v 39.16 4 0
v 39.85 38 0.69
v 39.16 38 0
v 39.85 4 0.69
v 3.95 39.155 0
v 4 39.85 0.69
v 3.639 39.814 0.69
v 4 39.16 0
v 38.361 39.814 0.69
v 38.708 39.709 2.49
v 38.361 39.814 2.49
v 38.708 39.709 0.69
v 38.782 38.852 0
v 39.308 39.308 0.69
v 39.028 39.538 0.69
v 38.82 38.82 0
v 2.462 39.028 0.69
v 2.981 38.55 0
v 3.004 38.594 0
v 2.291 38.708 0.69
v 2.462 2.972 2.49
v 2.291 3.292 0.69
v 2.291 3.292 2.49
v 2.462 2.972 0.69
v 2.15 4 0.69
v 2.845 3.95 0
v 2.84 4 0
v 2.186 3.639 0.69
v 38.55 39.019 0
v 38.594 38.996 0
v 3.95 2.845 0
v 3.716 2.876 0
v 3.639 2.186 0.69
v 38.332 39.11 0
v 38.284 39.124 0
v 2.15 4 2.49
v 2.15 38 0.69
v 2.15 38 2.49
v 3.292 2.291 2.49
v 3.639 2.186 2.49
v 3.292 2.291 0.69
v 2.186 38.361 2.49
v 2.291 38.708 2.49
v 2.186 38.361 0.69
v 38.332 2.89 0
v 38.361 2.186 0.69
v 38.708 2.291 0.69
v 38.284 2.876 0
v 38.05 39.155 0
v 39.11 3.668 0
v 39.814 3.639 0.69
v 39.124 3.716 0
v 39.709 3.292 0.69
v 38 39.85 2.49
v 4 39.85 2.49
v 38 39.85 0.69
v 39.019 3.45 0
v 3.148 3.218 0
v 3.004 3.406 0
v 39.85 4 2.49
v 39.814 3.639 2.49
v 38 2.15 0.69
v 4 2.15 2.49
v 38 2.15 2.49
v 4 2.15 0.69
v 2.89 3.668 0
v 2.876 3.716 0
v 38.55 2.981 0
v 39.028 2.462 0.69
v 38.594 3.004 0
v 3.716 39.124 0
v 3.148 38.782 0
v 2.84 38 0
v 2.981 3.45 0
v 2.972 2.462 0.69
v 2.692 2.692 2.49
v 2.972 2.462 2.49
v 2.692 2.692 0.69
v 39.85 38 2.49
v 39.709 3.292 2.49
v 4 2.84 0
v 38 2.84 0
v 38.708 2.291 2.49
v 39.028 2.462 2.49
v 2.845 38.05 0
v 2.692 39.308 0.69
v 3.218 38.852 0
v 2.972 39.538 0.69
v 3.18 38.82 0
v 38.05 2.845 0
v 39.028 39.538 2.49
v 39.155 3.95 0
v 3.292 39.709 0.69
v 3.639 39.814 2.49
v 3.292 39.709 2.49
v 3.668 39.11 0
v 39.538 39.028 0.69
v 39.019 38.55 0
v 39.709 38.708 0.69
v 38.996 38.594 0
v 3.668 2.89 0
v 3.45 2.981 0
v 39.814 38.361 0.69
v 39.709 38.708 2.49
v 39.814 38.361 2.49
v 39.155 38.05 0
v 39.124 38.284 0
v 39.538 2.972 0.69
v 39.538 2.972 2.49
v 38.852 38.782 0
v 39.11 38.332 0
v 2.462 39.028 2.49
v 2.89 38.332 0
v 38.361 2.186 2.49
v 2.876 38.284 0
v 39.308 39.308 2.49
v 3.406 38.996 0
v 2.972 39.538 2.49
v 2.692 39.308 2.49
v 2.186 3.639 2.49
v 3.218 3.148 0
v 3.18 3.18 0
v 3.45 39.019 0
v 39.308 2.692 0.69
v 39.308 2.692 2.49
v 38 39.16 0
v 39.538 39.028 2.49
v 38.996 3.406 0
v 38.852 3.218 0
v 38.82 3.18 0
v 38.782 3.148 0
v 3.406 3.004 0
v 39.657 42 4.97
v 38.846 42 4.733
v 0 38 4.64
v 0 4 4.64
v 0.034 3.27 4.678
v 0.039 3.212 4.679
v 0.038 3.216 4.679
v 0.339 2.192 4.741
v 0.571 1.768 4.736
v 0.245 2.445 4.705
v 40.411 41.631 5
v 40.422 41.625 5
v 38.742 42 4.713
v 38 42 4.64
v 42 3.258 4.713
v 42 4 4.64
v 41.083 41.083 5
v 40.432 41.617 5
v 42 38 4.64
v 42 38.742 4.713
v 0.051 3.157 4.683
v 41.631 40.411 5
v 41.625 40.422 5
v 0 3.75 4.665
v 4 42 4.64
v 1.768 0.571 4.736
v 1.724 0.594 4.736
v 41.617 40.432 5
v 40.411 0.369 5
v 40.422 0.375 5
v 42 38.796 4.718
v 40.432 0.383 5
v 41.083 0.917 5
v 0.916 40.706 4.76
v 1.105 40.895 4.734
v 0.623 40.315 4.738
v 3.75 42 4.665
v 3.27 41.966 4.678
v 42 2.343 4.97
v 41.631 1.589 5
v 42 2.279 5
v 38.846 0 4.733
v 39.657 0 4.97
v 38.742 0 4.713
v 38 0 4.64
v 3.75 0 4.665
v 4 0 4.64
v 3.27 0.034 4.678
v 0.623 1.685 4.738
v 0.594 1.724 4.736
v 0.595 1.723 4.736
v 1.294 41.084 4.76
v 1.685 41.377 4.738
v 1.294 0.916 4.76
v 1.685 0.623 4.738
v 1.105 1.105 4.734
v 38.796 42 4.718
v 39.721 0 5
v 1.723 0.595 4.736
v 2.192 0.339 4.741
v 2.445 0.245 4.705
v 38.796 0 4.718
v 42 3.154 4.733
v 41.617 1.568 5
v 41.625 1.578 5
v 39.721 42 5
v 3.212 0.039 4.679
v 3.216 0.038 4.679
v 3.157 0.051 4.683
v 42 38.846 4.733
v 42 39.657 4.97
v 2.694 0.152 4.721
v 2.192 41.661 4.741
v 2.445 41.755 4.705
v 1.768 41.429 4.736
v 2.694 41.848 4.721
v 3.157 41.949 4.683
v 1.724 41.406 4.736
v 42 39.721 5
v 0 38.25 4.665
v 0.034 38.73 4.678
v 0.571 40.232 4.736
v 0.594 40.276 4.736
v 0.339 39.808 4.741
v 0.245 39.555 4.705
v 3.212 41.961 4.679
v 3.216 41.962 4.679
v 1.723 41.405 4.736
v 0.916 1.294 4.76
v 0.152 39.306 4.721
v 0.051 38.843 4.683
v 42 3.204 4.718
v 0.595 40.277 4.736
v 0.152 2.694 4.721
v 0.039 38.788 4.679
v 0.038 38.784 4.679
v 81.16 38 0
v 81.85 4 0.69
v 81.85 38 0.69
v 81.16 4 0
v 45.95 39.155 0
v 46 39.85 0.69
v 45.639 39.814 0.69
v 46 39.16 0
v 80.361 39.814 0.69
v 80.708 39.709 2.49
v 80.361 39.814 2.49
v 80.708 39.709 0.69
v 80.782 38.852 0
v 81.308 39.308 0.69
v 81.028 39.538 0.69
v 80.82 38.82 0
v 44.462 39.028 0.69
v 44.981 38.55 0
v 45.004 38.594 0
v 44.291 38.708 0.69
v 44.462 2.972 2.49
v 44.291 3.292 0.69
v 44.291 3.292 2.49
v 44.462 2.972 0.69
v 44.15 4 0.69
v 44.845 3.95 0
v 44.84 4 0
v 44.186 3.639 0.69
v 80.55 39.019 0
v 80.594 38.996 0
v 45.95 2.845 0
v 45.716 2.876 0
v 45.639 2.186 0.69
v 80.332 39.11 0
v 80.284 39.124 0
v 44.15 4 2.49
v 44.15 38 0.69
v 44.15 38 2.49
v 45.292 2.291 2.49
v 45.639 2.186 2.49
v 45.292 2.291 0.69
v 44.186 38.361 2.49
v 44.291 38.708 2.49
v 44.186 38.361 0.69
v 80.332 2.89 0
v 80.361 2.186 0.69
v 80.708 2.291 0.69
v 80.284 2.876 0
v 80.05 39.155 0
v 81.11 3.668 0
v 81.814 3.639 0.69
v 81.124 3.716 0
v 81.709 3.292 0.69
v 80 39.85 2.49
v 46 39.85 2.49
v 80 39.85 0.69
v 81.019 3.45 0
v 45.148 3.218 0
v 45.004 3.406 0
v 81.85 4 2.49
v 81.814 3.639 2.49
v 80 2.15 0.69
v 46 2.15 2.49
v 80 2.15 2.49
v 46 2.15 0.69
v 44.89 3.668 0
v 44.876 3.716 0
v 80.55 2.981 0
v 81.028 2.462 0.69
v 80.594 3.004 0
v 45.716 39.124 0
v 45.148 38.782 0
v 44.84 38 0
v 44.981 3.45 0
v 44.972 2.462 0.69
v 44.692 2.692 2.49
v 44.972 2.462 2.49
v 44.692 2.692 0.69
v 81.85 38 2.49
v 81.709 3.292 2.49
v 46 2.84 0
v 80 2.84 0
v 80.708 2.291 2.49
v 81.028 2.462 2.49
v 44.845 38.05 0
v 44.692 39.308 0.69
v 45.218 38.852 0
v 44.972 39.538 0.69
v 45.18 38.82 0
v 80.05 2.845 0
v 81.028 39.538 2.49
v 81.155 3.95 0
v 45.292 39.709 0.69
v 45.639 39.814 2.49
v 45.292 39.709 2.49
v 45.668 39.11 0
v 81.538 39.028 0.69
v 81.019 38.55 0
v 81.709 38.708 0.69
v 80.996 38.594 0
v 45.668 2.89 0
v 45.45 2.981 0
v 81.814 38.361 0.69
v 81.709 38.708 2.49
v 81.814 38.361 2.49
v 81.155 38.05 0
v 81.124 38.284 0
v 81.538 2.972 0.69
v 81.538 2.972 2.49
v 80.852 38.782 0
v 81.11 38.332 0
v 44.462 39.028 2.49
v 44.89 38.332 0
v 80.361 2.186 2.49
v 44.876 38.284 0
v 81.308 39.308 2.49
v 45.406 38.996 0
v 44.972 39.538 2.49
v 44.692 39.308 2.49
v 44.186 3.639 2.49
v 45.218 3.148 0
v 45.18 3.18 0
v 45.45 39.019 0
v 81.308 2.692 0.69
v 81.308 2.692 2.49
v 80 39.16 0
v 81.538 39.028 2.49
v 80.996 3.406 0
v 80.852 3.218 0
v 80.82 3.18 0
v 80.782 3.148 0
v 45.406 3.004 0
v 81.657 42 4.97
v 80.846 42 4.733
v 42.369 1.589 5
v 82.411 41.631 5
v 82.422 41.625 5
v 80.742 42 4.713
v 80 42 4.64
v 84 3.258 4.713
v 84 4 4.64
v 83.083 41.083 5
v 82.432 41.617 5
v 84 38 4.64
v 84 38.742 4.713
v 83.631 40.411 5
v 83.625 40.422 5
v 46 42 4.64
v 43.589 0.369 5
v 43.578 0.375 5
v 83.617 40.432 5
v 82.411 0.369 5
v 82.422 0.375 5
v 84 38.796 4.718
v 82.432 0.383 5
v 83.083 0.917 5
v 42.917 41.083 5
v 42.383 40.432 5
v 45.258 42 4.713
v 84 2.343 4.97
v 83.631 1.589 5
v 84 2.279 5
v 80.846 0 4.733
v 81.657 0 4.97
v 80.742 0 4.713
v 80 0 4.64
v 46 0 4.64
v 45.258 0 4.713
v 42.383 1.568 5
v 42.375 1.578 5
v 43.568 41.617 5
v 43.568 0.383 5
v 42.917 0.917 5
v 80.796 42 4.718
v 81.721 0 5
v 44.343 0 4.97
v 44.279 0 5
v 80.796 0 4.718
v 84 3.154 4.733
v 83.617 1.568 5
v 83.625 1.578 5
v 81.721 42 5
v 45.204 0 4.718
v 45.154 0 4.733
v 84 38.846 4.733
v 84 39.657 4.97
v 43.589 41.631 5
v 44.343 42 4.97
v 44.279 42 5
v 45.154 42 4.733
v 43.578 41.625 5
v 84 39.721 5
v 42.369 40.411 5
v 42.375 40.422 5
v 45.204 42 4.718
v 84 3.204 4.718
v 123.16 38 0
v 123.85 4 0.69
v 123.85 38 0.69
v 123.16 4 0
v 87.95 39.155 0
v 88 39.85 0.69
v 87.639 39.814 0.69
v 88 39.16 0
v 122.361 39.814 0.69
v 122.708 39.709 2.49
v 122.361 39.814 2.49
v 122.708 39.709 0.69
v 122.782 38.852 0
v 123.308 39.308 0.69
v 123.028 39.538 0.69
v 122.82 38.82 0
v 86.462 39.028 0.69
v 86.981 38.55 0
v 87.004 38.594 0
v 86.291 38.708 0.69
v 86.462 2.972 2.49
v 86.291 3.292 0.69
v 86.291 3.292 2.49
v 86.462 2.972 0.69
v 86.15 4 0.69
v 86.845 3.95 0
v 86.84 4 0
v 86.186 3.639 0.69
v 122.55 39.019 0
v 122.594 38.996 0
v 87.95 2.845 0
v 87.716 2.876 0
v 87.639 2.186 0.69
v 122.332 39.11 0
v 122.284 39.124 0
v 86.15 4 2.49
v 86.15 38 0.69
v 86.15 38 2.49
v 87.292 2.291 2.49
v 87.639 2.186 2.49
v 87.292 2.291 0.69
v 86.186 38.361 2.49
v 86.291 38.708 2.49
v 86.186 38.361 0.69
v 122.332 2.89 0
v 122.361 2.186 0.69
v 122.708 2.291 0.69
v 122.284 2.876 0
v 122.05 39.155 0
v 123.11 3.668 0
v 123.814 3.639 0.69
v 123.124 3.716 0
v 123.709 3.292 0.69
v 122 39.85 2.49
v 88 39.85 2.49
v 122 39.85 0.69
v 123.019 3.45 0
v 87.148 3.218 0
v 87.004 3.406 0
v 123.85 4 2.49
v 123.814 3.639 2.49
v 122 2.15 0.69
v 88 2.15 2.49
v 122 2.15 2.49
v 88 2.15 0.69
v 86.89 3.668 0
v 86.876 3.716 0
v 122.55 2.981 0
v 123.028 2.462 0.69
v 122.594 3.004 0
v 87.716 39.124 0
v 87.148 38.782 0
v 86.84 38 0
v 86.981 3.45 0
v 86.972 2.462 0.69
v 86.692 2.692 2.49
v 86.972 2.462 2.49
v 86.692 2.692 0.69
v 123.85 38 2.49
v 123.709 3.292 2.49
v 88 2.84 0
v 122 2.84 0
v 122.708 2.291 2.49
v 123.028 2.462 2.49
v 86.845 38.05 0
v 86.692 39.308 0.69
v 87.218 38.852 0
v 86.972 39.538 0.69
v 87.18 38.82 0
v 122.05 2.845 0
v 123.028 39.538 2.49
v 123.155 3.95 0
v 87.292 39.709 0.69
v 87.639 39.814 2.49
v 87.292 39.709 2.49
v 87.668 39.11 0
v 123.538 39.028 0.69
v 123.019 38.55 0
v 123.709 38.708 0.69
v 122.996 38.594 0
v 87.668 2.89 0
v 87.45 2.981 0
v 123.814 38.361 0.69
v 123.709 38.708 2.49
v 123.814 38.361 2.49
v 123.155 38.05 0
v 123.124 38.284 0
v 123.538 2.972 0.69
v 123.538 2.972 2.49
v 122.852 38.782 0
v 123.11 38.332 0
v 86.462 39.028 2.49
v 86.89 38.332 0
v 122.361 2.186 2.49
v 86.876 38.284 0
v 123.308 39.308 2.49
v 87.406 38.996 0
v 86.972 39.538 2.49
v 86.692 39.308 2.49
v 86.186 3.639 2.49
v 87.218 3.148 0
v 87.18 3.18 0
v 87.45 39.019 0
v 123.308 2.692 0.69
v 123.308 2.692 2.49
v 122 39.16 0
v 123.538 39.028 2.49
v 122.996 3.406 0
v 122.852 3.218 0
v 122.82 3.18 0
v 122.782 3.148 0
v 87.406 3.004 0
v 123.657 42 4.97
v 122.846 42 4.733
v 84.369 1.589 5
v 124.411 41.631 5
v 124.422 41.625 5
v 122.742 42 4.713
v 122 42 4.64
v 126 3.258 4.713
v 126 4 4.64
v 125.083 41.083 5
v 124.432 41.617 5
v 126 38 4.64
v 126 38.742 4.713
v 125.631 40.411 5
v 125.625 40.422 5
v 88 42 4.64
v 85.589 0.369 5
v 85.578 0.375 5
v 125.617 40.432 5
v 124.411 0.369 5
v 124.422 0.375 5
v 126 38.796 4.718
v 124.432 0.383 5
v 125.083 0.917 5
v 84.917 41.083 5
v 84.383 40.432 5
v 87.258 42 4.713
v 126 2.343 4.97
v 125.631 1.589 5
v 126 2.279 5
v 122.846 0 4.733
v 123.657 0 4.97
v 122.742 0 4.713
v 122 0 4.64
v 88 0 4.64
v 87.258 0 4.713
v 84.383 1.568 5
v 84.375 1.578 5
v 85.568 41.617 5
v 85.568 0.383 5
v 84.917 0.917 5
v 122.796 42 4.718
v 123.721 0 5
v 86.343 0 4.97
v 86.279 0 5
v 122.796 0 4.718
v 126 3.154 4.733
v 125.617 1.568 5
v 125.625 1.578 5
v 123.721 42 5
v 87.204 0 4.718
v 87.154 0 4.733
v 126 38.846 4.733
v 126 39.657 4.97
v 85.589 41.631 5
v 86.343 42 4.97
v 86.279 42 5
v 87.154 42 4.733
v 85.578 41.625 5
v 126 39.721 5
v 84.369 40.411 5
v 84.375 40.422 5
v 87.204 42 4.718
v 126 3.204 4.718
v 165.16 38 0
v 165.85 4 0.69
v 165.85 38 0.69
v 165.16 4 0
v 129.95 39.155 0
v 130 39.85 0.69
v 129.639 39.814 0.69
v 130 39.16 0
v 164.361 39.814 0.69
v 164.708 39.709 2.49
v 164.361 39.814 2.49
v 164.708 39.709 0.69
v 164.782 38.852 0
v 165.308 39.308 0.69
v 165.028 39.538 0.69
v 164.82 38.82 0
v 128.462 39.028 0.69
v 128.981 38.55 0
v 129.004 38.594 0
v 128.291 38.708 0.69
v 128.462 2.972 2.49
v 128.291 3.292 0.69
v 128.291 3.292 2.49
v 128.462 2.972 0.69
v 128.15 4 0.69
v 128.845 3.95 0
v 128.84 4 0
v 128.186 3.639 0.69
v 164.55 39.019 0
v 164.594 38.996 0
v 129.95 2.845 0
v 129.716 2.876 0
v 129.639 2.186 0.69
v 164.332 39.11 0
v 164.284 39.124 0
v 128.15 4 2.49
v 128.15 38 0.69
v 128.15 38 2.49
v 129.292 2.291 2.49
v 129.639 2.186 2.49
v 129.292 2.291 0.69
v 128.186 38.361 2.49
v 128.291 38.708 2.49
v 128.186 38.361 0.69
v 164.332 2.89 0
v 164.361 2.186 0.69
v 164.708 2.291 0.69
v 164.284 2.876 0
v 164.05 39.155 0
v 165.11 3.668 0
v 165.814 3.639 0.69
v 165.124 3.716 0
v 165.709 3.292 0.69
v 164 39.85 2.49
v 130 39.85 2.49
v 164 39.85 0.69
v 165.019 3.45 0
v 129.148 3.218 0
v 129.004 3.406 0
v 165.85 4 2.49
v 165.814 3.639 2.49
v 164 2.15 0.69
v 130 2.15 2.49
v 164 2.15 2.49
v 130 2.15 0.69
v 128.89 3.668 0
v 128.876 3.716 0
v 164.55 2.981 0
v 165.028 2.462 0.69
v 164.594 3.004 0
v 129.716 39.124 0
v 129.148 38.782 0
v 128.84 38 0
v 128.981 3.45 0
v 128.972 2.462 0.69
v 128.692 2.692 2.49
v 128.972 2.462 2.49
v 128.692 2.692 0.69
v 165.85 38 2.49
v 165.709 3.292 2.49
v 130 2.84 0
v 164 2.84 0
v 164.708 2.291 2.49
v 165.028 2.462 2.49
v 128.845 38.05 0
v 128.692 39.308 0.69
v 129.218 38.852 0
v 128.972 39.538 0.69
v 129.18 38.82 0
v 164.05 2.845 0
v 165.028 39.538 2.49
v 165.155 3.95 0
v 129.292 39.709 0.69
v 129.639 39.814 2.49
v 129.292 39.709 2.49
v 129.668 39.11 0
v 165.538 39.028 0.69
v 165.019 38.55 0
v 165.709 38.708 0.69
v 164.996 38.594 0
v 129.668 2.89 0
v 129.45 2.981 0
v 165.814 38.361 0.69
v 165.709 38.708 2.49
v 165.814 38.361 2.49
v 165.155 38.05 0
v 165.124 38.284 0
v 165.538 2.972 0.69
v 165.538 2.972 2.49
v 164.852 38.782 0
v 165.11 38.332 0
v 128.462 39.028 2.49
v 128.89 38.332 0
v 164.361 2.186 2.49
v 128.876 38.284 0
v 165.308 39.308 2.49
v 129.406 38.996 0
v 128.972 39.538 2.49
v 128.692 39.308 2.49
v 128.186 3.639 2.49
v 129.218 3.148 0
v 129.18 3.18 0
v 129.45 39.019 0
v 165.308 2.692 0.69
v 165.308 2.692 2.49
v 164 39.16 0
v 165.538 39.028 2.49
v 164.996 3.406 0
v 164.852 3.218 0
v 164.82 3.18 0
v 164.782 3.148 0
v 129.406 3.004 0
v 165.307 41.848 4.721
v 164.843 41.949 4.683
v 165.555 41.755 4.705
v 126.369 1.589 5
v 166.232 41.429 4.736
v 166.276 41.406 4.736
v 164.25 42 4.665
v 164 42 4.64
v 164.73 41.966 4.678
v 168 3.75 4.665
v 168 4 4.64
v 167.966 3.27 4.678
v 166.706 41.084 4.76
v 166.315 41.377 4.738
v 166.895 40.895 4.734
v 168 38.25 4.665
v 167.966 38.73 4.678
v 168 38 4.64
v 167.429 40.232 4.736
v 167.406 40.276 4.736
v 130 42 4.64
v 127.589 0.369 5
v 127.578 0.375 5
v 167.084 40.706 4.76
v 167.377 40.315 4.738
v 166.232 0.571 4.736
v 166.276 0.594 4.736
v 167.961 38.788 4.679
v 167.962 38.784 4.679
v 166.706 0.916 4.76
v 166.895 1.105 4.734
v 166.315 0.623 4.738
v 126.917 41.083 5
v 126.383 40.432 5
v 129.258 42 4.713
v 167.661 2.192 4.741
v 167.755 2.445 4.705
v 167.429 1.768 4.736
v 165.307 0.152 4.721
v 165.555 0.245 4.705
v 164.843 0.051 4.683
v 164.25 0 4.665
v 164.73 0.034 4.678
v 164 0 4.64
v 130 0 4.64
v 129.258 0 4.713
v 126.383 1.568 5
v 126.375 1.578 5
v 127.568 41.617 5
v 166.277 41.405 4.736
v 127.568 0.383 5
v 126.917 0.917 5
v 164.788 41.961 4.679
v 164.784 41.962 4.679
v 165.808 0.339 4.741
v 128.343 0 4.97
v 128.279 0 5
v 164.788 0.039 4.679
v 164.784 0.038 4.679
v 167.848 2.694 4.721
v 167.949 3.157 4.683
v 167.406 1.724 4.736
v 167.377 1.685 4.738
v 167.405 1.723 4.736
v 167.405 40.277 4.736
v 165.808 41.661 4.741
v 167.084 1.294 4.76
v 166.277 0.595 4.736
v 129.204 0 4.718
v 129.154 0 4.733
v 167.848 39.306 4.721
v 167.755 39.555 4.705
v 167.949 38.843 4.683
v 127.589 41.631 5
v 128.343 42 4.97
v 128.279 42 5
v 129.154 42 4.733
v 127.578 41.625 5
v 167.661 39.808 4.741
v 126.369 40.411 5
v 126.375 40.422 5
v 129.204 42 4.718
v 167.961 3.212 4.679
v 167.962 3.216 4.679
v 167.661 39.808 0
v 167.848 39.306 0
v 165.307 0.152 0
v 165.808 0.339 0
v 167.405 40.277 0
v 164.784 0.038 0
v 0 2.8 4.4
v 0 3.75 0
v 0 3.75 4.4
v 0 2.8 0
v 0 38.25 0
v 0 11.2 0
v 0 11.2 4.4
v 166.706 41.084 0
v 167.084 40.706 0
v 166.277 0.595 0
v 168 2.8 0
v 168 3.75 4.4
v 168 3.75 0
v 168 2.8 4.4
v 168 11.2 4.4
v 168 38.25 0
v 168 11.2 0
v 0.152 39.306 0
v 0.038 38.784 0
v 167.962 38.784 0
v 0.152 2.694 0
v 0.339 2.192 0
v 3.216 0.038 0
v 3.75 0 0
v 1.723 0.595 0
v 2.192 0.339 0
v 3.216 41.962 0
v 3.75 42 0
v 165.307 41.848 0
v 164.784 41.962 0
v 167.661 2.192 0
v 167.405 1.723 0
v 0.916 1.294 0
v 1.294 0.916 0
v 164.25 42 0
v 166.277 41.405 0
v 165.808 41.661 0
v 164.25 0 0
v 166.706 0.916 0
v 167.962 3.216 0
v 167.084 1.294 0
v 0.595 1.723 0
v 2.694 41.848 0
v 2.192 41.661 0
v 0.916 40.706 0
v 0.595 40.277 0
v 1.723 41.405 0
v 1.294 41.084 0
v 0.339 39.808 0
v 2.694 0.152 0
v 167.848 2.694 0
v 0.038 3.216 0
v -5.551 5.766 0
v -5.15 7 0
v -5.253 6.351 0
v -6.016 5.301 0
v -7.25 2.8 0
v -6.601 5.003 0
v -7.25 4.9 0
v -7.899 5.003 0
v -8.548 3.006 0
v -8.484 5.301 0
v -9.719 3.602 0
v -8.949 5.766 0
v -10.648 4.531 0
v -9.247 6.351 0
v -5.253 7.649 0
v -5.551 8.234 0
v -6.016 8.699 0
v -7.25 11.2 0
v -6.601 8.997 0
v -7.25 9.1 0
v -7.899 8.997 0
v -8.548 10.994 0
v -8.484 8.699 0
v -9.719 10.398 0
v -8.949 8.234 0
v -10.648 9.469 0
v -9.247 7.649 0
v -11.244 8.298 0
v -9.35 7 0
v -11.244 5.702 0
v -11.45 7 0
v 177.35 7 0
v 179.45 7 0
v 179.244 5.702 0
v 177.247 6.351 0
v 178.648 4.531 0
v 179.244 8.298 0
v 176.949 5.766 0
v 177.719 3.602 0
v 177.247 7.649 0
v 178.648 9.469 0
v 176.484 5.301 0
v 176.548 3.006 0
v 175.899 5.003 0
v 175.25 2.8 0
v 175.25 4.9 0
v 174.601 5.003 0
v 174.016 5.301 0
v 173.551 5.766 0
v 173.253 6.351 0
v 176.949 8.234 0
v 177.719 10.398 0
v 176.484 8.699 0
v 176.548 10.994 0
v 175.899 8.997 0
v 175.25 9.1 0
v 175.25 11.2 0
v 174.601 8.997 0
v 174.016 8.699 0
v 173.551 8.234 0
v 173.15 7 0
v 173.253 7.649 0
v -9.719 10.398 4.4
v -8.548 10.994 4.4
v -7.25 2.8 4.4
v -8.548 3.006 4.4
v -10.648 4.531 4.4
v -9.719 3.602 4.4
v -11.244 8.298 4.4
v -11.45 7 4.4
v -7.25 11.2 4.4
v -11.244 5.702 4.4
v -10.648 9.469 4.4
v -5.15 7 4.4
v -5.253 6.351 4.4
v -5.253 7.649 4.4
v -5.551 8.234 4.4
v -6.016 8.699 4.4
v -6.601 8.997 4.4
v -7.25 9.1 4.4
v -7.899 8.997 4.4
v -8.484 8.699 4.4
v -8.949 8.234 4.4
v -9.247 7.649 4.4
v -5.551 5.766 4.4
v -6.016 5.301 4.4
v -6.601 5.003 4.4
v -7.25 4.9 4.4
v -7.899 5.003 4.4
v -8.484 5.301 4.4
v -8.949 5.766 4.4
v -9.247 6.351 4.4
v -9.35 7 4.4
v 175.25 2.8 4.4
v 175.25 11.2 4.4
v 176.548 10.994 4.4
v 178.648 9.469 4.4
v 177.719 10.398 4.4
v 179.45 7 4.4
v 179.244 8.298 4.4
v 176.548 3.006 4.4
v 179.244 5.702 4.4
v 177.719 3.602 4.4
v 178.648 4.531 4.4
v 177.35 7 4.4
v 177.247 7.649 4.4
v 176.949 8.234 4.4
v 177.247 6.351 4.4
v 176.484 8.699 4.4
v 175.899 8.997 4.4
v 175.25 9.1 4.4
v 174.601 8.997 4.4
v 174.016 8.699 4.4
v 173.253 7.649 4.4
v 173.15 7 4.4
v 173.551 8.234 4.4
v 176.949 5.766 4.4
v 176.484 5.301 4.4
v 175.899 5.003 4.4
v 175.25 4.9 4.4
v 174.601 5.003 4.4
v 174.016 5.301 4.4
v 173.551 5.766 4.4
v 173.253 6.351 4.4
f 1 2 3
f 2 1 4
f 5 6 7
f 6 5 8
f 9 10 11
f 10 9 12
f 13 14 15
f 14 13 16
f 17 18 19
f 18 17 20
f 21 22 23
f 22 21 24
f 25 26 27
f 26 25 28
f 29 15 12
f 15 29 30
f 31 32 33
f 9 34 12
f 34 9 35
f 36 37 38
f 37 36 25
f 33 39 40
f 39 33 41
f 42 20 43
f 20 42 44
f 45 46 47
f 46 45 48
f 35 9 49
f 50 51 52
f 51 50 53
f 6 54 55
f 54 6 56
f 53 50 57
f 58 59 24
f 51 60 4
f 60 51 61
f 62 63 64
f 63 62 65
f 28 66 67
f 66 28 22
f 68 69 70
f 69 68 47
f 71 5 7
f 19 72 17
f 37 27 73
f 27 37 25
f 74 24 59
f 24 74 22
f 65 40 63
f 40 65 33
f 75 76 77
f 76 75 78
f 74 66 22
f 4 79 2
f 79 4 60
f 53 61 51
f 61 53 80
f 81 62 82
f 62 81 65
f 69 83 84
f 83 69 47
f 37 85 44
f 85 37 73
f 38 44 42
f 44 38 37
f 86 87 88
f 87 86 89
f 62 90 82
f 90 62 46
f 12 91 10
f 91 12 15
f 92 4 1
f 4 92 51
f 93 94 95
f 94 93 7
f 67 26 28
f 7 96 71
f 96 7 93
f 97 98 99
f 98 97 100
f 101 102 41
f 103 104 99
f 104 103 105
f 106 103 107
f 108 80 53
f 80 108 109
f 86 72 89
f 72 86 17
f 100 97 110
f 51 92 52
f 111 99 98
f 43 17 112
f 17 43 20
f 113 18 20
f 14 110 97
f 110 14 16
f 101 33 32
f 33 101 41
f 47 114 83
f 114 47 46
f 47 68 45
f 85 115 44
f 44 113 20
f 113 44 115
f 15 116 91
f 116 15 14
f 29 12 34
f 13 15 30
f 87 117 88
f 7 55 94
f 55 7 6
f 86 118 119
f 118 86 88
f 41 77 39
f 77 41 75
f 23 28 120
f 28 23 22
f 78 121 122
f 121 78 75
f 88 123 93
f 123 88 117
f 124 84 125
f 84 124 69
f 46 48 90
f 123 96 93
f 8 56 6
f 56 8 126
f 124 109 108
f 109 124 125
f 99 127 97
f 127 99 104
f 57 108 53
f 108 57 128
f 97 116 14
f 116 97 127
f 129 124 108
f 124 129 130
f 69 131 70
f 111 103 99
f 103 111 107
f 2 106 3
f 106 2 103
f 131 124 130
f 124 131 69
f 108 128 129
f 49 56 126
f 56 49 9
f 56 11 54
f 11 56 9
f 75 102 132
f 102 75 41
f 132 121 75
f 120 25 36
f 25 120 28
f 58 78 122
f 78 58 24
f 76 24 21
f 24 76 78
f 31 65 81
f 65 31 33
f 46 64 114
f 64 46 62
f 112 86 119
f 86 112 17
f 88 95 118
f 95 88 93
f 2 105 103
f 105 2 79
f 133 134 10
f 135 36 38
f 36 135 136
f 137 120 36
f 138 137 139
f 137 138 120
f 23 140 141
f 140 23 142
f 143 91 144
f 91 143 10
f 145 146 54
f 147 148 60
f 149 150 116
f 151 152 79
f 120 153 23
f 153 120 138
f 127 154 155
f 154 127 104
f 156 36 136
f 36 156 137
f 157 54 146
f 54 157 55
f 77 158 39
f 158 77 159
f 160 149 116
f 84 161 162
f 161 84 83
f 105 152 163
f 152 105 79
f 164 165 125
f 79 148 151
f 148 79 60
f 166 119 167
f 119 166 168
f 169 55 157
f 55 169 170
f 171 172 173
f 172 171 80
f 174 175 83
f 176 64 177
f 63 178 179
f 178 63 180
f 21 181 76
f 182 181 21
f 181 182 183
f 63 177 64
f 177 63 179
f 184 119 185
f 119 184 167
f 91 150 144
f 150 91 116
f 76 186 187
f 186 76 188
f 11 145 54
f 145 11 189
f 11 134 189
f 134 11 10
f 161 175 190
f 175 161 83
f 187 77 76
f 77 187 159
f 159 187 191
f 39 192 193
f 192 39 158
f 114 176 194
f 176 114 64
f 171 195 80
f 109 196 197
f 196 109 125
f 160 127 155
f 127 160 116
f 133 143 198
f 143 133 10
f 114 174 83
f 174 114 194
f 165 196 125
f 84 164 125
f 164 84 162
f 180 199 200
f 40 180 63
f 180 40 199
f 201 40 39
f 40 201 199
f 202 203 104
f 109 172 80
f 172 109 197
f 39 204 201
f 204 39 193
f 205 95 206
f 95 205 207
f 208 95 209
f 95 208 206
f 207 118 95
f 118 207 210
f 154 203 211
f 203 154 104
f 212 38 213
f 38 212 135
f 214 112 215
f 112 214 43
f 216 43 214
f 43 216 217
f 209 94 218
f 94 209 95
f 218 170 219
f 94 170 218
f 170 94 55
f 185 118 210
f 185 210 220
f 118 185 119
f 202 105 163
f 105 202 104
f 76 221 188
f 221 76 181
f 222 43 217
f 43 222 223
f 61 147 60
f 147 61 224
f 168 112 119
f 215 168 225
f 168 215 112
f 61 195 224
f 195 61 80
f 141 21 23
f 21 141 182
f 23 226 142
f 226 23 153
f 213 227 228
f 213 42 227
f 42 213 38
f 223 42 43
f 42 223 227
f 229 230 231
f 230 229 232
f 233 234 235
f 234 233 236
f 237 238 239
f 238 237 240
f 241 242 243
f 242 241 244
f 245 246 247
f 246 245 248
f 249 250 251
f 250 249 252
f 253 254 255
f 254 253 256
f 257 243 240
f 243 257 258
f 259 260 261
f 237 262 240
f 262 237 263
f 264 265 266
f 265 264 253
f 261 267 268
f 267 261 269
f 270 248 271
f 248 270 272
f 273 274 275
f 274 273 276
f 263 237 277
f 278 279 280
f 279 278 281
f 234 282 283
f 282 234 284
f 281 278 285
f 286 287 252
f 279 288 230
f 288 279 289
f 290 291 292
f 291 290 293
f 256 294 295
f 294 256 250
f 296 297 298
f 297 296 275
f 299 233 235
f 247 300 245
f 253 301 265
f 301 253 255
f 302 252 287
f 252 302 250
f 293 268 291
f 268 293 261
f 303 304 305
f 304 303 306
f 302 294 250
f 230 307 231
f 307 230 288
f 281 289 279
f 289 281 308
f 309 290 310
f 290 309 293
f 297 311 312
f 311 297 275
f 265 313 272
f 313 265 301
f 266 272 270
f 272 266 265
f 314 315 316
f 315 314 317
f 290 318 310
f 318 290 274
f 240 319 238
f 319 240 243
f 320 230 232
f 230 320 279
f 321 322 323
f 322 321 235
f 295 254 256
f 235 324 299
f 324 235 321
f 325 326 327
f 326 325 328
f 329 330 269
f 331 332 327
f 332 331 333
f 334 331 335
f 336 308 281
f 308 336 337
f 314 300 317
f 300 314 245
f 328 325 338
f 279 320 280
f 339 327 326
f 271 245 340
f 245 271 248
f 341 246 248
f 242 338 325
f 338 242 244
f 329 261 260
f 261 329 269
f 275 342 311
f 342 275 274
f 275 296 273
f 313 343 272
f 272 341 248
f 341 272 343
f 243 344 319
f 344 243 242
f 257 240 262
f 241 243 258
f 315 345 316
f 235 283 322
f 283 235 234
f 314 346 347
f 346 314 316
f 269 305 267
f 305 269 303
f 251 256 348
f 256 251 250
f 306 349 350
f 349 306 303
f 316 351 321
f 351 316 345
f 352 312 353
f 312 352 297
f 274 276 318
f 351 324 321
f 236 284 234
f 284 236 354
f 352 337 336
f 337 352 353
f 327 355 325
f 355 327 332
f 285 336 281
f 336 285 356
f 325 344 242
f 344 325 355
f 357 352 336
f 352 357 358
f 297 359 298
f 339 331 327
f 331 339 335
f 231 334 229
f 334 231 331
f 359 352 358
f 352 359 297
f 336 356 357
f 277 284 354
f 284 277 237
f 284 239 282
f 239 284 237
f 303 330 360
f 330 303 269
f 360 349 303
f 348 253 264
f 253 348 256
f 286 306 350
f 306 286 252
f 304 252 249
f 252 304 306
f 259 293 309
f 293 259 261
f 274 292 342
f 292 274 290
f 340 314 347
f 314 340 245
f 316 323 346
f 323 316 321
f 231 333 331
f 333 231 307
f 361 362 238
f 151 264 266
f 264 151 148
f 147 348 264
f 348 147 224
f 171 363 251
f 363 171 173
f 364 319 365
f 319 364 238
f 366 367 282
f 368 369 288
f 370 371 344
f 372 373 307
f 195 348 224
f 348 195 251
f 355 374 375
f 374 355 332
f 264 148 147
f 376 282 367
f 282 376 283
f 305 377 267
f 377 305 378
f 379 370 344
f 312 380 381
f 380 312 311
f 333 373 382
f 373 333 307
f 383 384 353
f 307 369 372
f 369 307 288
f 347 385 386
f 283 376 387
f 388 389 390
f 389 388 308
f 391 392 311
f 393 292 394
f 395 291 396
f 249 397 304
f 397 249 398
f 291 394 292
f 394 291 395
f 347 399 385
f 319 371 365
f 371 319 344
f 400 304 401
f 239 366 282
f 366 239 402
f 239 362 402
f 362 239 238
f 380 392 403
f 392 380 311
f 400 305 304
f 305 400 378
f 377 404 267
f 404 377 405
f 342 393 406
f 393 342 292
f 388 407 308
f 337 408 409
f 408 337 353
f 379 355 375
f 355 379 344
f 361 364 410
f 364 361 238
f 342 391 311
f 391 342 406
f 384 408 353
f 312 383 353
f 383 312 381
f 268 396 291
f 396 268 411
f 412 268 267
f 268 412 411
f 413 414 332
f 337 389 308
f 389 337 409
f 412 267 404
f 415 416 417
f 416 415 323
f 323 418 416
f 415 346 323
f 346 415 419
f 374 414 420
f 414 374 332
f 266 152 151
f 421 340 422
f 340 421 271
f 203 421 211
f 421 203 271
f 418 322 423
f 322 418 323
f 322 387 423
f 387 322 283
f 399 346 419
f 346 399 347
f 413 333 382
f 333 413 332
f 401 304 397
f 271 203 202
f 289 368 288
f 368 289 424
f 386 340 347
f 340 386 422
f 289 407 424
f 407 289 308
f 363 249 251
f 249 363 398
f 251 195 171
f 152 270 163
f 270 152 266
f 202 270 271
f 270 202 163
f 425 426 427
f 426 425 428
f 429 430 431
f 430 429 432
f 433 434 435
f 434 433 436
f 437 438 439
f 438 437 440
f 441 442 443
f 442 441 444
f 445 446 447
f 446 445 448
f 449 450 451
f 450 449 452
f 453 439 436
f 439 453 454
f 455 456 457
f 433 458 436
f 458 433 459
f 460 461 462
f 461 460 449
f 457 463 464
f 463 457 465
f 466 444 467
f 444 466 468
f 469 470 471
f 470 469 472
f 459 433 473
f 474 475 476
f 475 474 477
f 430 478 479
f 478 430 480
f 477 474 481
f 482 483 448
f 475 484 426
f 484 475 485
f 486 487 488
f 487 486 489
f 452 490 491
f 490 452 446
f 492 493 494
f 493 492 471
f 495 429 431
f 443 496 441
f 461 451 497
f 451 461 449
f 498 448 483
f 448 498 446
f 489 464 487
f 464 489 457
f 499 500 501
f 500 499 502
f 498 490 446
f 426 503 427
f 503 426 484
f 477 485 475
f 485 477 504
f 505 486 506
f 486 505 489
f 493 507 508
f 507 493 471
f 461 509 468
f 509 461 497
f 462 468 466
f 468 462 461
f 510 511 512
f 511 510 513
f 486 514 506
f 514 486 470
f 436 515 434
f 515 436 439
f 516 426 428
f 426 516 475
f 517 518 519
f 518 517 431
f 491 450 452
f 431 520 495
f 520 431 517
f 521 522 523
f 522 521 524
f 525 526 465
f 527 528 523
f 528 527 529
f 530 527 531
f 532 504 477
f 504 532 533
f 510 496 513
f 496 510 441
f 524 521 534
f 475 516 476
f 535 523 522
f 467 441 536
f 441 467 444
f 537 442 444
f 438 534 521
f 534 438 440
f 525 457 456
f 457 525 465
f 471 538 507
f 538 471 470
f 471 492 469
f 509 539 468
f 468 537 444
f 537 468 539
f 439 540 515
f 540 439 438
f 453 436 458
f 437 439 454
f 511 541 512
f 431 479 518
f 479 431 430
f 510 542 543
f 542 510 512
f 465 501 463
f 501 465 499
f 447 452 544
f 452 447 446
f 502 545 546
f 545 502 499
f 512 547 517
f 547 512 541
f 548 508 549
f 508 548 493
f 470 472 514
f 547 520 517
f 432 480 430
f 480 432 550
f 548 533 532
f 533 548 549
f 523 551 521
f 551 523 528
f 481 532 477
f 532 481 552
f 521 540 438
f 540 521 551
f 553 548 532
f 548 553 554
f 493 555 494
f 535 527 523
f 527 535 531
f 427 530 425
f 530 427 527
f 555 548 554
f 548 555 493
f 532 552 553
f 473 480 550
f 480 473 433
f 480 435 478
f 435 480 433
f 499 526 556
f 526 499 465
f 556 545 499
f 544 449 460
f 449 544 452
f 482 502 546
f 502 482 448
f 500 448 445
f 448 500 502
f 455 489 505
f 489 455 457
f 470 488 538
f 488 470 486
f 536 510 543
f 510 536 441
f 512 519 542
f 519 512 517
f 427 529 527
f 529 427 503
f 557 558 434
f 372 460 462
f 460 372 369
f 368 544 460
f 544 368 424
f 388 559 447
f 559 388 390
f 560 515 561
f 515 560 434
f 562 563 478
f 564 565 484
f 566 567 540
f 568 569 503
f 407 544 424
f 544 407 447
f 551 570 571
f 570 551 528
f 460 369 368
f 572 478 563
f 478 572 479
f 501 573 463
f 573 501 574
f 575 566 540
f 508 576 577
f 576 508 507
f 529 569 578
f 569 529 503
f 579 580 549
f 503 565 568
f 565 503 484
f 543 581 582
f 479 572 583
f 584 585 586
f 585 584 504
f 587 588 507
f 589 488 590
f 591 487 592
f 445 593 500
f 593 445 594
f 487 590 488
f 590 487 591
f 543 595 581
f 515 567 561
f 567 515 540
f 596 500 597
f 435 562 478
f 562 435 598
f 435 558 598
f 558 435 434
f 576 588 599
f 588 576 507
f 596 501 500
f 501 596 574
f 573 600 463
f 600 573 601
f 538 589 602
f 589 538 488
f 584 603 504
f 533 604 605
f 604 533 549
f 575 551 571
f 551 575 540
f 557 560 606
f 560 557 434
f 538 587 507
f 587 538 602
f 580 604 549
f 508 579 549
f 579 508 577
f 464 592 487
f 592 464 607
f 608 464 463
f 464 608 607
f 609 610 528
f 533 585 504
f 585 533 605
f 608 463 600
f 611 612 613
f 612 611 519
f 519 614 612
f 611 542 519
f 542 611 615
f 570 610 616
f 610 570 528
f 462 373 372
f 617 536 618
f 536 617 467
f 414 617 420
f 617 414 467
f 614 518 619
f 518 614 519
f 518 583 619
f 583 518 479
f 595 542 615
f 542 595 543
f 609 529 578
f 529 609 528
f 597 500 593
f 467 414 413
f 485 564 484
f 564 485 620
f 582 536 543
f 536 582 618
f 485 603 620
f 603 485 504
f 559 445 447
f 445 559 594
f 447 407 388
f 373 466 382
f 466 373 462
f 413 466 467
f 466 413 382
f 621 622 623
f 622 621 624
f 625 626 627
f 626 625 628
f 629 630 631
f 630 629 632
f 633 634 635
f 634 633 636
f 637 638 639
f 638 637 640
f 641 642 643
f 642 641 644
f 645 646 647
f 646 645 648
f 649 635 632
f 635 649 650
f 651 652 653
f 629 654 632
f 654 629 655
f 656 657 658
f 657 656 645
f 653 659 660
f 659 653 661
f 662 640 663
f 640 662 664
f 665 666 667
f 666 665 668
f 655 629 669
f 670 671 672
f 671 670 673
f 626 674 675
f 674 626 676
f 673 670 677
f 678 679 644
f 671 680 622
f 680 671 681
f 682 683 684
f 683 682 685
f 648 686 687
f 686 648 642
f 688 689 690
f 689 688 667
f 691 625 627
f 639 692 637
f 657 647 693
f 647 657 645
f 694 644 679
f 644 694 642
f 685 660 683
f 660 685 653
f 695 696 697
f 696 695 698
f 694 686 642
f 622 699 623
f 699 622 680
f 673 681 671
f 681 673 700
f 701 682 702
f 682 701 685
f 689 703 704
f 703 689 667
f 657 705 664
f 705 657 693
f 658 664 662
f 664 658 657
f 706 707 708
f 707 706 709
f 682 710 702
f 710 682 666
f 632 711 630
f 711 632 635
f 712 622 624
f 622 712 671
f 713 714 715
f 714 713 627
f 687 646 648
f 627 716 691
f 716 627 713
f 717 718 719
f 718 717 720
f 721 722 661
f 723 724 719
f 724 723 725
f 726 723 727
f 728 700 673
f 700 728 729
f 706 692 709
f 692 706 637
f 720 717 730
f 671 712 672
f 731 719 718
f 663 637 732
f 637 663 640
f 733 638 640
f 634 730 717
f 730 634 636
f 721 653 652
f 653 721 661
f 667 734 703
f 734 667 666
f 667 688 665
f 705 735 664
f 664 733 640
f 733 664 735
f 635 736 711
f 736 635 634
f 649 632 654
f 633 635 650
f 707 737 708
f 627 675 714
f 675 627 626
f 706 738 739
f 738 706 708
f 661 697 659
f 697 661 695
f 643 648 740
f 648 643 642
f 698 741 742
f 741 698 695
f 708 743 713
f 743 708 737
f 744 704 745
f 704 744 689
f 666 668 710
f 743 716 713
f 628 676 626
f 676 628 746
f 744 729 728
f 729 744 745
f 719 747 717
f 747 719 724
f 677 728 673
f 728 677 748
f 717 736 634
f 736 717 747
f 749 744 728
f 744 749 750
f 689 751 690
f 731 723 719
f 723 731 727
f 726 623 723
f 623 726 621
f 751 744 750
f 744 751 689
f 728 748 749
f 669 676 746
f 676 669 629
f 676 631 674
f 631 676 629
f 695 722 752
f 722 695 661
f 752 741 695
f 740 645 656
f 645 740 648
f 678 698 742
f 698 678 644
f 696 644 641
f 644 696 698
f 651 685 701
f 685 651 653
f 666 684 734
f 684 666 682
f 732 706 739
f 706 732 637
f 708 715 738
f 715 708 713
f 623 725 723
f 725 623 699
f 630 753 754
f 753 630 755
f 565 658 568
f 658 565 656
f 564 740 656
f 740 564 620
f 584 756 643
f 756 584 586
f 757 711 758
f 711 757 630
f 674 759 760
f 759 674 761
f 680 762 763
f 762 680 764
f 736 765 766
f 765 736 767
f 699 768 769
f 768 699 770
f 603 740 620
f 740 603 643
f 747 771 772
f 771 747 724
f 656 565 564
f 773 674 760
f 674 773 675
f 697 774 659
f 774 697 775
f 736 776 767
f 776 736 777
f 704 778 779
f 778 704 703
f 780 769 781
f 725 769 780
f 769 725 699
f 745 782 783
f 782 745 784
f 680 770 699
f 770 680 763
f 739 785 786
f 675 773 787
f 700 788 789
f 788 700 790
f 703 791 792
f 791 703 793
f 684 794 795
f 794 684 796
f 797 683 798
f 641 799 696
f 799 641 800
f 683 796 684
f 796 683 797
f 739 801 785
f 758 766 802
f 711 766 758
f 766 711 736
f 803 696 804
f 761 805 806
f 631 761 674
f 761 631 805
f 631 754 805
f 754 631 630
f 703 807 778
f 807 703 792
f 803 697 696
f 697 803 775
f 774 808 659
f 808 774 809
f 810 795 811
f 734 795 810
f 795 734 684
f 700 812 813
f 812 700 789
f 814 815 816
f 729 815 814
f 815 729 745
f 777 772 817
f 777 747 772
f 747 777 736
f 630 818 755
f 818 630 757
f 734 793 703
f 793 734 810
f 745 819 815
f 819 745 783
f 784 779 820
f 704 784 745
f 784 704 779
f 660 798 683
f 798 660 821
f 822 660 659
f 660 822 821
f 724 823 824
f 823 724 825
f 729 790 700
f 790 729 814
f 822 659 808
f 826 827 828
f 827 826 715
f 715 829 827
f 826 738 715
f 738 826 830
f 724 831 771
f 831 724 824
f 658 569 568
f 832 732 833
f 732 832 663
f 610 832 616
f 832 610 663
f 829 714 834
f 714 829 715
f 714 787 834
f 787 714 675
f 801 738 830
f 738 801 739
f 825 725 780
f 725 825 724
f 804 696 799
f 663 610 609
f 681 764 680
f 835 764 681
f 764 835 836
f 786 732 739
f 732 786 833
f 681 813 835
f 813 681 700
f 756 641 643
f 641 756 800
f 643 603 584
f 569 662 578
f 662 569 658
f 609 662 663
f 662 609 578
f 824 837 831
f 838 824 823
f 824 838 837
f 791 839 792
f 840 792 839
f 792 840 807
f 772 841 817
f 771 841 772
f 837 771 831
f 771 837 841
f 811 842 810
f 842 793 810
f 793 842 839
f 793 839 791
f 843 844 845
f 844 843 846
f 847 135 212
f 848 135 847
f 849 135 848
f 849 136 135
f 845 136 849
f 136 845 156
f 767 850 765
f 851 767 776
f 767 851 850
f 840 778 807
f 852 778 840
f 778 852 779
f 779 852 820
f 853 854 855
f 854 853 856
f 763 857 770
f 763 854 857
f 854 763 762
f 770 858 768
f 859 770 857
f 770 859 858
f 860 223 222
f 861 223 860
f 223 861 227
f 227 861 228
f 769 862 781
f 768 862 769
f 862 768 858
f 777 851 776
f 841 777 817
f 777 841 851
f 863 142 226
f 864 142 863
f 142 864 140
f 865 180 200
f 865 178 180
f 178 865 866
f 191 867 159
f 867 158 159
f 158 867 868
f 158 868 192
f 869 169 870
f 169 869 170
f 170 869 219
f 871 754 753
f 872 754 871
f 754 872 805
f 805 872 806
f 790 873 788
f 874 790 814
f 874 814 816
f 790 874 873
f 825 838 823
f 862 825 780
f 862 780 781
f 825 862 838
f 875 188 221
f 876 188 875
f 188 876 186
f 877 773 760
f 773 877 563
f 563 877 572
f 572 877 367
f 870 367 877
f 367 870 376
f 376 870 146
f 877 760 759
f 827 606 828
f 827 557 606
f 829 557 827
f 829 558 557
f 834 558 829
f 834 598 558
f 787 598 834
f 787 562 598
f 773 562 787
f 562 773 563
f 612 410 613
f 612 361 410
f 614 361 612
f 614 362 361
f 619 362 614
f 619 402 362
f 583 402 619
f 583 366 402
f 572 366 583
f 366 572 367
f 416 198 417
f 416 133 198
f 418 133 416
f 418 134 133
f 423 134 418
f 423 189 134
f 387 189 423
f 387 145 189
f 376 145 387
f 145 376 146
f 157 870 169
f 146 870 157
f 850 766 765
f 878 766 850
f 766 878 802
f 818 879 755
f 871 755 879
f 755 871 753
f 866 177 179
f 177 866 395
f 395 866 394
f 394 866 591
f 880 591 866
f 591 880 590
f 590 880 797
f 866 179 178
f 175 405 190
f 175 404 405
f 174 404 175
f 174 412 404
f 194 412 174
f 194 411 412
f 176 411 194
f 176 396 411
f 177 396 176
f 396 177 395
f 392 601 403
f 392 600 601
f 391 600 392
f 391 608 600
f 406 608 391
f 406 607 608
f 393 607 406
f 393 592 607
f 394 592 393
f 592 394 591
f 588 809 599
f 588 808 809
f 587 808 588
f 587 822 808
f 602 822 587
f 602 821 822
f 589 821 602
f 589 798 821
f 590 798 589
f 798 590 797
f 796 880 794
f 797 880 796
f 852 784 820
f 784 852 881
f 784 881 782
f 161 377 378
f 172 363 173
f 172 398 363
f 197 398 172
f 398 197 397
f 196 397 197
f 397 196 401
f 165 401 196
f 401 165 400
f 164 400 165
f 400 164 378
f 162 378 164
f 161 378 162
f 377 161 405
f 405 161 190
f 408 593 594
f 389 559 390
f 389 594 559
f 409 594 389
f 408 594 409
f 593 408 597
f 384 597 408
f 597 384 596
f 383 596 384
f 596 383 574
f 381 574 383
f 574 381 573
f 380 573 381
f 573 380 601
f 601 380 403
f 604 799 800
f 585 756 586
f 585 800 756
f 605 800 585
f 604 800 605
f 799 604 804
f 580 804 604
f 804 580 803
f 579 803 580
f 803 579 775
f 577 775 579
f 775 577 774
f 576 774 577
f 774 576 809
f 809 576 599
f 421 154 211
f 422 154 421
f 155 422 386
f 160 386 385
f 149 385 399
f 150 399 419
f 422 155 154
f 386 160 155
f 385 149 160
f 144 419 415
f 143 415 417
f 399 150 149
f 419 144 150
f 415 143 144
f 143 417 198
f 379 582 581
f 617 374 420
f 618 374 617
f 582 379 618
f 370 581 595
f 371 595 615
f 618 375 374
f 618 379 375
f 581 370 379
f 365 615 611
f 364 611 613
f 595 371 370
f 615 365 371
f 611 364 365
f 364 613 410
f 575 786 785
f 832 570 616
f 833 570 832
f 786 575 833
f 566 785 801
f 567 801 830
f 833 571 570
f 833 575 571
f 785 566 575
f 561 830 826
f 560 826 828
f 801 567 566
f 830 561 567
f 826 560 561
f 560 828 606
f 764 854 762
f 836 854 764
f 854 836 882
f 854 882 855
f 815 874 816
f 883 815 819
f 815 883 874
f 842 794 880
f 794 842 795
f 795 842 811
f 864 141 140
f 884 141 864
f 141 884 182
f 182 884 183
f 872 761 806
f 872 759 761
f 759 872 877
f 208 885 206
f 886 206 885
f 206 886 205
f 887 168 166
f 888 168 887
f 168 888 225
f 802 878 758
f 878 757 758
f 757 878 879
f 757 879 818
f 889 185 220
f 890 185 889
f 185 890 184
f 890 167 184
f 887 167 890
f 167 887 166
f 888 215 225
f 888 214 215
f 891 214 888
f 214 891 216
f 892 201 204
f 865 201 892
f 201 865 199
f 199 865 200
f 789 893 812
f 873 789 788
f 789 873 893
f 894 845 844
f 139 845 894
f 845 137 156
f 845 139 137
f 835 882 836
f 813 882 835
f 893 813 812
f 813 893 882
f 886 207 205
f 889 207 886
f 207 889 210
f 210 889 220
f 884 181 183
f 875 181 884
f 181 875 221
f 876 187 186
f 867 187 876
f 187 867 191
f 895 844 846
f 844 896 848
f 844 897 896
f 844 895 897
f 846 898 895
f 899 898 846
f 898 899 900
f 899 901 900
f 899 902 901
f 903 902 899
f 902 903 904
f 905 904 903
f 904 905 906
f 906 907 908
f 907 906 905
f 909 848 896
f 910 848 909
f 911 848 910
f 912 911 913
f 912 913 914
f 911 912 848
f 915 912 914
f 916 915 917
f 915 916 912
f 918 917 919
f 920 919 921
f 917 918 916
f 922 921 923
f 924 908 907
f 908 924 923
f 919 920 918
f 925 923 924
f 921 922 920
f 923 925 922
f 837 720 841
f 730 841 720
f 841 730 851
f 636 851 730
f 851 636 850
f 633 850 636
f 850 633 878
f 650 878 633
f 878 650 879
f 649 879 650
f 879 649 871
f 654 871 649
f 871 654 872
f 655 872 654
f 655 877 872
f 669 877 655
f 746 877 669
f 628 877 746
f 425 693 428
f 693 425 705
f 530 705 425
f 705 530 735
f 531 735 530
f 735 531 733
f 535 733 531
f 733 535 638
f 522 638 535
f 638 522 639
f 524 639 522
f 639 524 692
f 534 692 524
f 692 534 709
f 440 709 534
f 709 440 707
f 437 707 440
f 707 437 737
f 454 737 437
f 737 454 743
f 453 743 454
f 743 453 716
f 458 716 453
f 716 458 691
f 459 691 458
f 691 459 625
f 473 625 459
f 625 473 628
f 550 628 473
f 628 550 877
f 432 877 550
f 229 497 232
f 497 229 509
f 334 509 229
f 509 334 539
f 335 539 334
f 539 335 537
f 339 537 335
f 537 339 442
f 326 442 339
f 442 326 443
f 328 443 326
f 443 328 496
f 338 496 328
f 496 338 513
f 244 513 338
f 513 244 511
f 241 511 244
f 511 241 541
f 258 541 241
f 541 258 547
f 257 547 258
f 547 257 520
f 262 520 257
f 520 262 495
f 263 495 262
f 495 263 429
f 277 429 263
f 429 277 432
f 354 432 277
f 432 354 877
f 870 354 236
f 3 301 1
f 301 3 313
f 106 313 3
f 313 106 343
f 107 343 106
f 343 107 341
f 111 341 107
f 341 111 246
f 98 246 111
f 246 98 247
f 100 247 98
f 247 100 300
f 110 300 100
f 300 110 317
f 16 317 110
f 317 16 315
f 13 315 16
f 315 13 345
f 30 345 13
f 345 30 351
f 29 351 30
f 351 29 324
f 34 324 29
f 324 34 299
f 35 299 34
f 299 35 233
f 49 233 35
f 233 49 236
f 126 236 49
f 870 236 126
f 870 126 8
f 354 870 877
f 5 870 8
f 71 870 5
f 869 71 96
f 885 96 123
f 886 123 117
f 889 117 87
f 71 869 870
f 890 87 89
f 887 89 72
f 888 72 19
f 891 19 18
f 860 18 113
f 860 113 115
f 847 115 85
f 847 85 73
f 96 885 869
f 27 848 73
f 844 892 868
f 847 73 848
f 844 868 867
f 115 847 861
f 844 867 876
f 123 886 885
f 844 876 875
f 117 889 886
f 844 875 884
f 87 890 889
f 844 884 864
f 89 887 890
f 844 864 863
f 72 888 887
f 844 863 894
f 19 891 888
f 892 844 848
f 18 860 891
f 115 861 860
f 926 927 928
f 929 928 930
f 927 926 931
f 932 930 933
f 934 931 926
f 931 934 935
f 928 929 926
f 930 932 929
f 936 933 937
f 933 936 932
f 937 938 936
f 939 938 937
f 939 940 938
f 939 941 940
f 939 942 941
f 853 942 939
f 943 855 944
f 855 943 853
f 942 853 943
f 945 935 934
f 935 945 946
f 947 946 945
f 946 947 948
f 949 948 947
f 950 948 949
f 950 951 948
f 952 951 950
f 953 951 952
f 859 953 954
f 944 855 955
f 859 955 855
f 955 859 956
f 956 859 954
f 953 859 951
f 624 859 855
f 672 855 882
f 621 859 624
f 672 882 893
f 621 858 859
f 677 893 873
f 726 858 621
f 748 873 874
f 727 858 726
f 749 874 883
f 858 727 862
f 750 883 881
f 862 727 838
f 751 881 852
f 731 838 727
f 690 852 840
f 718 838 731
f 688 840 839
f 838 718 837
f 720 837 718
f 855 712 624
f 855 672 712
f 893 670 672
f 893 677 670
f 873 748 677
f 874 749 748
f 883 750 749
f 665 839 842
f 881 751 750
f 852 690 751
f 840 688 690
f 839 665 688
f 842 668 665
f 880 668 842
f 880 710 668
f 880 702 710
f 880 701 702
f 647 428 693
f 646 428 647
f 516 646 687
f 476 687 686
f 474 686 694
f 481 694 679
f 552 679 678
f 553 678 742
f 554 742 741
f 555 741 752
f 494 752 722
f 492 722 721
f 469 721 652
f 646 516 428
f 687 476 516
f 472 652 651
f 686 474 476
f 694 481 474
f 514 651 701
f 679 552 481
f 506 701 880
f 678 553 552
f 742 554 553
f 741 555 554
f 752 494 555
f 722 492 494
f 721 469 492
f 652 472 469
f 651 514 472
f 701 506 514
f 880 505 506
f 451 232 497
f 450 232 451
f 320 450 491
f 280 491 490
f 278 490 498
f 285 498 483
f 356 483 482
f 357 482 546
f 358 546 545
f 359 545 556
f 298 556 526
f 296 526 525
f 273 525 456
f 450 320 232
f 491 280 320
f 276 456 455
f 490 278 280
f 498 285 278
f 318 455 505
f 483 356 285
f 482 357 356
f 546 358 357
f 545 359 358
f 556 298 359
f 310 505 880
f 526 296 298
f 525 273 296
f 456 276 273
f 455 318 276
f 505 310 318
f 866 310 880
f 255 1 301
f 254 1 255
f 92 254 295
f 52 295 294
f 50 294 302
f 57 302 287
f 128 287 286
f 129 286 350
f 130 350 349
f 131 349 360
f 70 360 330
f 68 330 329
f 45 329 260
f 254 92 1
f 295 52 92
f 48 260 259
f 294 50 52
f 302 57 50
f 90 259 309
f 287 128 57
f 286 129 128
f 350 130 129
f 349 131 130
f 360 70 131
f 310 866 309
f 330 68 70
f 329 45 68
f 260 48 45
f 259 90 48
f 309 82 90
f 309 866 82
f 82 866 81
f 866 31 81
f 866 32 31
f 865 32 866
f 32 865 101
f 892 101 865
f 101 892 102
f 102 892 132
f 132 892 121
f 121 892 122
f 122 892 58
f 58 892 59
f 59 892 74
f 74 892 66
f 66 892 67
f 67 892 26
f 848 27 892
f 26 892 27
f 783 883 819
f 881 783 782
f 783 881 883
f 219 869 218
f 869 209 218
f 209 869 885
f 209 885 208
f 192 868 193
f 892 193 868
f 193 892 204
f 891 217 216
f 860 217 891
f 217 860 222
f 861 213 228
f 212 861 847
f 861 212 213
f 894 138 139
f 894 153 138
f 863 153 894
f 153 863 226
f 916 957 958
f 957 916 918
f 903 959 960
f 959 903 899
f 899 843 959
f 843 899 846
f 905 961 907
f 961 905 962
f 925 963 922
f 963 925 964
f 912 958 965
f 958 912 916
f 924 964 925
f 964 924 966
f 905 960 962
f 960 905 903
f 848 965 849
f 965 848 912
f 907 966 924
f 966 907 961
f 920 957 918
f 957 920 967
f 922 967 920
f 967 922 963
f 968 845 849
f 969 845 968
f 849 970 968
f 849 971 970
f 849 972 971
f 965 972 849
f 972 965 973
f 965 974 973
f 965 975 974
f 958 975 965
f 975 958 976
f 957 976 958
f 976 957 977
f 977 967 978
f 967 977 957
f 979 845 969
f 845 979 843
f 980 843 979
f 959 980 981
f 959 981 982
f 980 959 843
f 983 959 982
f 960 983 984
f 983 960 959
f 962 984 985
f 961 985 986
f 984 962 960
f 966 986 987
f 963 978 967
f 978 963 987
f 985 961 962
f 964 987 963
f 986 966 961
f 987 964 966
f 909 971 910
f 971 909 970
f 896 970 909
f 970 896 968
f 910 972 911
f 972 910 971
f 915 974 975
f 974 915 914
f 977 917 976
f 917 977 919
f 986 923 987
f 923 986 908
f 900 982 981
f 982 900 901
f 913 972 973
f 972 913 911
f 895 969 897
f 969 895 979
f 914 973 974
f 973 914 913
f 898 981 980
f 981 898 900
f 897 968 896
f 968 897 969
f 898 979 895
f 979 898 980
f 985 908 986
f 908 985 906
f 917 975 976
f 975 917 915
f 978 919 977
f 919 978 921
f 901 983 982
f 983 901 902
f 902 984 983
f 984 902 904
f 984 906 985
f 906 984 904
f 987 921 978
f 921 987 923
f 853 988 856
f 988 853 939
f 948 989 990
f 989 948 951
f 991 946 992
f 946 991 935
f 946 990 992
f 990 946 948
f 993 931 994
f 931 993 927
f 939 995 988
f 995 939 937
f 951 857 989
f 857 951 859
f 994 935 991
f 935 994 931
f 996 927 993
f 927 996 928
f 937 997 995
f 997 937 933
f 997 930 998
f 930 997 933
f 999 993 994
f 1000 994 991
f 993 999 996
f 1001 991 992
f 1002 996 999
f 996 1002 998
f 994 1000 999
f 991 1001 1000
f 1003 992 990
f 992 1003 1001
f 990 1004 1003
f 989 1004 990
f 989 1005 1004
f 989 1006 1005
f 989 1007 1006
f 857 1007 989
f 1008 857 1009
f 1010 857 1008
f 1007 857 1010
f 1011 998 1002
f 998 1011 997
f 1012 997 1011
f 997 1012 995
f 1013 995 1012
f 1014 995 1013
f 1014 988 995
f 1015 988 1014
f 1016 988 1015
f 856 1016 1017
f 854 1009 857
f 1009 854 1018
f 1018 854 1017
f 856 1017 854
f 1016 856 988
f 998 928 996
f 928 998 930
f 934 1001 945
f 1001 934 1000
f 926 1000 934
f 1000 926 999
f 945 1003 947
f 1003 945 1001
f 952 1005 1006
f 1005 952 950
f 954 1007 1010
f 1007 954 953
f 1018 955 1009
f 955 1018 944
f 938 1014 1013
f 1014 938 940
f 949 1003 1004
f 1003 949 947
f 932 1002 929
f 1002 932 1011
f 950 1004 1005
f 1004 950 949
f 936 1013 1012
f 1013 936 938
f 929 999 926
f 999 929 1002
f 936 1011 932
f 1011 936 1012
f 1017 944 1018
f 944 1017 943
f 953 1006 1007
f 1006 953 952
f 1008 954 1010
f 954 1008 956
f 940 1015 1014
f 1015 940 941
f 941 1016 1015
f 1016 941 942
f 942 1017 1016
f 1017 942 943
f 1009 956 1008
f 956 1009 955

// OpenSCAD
// file: gridfinity_baseplate.scad
// include instead of use, so we get the pitch
include <gridfinity_modules.scad>

xsize = 5;
ysize = 3;
weighted = false;
lid = false;

if (lid) {
  base_lid(xsize, ysize);
}
else if (weighted) {
  weighted_baseplate(xsize, ysize);
}
else {
  frame_plain(xsize, ysize);
}


module base_lid(num_x, num_y) {
  magnet_od = 6.5;
  magnet_position = min(gridfinity_pitch/2-8, gridfinity_pitch/2-4-magnet_od/2);
  magnet_thickness = 2.4;
  eps = 0.1;
  
  translate([0, 0, 7]) frame_plain(xsize, ysize, trim=0.25);
  difference() {
    grid_block(xsize, ysize, 1, magnet_diameter=0, screw_depth=0);
    gridcopy(num_x, num_y) {
      cornercopy(magnet_position) {
        translate([0, 0, 7-magnet_thickness])
        cylinder(d=magnet_od, h=magnet_thickness+eps, $fn=48);
      }
    }
  }
}


module weighted_baseplate(num_x, num_y) {
  magnet_od = 6.5;
  magnet_position = min(gridfinity_pitch/2-8, gridfinity_pitch/2-4-magnet_od/2);
  magnet_thickness = 2.4;
  eps = 0.1;
  
  difference() {
    frame_plain(num_x, num_y, 6.4);
    
    gridcopy(num_x, num_y) {
      cornercopy(magnet_position) {
        translate([0, 0, -magnet_thickness])
        cylinder(d=magnet_od, h=magnet_thickness+eps, $fn=48);
        
        translate([0, 0, -6.4]) cylinder(d=3.5, h=6.4, $fn=24);
        
        // counter-sunk holes in the bottom
        translate([0, 0, -6.41]) cylinder(d1=8.5, d2=3.5, h=2.5, $fn=24);
      }
      
      translate([-10.7, -10.7, -6.41]) cube([21.4, 21.4, 4.01]);
      
      for (a2=[0,90]) rotate([0, 0, a2])
      hull() for (a=[0, 180]) rotate([0, 0, a])
      translate([-14.9519, 0, -6.41]) cylinder(d=8.5, h=2.01, $fn=24);
    }
  }
}


module frame_plain(num_x, num_y, extra_down=0, trim=0) {
  ht = extra_down > 0 ? 4.4 : 5;
  corner_radius = 3.75;
  corner_position = gridfinity_pitch/2-corner_radius-trim;
  difference() {
    hull() cornercopy(corner_position, num_x, num_y) 
    translate([0, 0, -extra_down]) cylinder(r=corner_radius, h=ht+extra_down, $fn=44);
    translate([0, 0, trim ? 0 : -0.01]) 
    render() gridcopy(num_x, num_y) pad_oversize(margins=1);
  }
}
// main file
// include instead of use, so we get the pitch
include <gridfinity_modules.scad>
use <gridfinity_baseplate.scad>   // for frame_plain

translate([gridfinity_pitch/2, gridfinity_pitch/2, 0]) frame_plain(4, 1);
ear_hole_x = 182.5; // distance between existing screw holes on FLSUN q5.
ear_hole_y = 7; // distance of screw hole from the front panel.
from_ends = (ear_hole_x - gridfinity_pitch*4) / 2;
cube_z = 4.4; // ht from above.
M4_d = 4.2; // diameter needed for an M4 bolt.

for (i = [0,1]) {
    x = i * ear_hole_x - from_ends;
    difference() {
        hull() {
            translate([x, ear_hole_y, 0]) cylinder(h=cube_z, d=M4_d*2, $fn=20);
            translate([x - from_ends * i, ear_hole_y - M4_d, 0]) cube([from_ends, M4_d*2, cube_z]);
            }
        translate([x, ear_hole_y, -0.01]) cylinder(h=cube_z + 0.02, d=M4_d, $fn=20);
    }
}
